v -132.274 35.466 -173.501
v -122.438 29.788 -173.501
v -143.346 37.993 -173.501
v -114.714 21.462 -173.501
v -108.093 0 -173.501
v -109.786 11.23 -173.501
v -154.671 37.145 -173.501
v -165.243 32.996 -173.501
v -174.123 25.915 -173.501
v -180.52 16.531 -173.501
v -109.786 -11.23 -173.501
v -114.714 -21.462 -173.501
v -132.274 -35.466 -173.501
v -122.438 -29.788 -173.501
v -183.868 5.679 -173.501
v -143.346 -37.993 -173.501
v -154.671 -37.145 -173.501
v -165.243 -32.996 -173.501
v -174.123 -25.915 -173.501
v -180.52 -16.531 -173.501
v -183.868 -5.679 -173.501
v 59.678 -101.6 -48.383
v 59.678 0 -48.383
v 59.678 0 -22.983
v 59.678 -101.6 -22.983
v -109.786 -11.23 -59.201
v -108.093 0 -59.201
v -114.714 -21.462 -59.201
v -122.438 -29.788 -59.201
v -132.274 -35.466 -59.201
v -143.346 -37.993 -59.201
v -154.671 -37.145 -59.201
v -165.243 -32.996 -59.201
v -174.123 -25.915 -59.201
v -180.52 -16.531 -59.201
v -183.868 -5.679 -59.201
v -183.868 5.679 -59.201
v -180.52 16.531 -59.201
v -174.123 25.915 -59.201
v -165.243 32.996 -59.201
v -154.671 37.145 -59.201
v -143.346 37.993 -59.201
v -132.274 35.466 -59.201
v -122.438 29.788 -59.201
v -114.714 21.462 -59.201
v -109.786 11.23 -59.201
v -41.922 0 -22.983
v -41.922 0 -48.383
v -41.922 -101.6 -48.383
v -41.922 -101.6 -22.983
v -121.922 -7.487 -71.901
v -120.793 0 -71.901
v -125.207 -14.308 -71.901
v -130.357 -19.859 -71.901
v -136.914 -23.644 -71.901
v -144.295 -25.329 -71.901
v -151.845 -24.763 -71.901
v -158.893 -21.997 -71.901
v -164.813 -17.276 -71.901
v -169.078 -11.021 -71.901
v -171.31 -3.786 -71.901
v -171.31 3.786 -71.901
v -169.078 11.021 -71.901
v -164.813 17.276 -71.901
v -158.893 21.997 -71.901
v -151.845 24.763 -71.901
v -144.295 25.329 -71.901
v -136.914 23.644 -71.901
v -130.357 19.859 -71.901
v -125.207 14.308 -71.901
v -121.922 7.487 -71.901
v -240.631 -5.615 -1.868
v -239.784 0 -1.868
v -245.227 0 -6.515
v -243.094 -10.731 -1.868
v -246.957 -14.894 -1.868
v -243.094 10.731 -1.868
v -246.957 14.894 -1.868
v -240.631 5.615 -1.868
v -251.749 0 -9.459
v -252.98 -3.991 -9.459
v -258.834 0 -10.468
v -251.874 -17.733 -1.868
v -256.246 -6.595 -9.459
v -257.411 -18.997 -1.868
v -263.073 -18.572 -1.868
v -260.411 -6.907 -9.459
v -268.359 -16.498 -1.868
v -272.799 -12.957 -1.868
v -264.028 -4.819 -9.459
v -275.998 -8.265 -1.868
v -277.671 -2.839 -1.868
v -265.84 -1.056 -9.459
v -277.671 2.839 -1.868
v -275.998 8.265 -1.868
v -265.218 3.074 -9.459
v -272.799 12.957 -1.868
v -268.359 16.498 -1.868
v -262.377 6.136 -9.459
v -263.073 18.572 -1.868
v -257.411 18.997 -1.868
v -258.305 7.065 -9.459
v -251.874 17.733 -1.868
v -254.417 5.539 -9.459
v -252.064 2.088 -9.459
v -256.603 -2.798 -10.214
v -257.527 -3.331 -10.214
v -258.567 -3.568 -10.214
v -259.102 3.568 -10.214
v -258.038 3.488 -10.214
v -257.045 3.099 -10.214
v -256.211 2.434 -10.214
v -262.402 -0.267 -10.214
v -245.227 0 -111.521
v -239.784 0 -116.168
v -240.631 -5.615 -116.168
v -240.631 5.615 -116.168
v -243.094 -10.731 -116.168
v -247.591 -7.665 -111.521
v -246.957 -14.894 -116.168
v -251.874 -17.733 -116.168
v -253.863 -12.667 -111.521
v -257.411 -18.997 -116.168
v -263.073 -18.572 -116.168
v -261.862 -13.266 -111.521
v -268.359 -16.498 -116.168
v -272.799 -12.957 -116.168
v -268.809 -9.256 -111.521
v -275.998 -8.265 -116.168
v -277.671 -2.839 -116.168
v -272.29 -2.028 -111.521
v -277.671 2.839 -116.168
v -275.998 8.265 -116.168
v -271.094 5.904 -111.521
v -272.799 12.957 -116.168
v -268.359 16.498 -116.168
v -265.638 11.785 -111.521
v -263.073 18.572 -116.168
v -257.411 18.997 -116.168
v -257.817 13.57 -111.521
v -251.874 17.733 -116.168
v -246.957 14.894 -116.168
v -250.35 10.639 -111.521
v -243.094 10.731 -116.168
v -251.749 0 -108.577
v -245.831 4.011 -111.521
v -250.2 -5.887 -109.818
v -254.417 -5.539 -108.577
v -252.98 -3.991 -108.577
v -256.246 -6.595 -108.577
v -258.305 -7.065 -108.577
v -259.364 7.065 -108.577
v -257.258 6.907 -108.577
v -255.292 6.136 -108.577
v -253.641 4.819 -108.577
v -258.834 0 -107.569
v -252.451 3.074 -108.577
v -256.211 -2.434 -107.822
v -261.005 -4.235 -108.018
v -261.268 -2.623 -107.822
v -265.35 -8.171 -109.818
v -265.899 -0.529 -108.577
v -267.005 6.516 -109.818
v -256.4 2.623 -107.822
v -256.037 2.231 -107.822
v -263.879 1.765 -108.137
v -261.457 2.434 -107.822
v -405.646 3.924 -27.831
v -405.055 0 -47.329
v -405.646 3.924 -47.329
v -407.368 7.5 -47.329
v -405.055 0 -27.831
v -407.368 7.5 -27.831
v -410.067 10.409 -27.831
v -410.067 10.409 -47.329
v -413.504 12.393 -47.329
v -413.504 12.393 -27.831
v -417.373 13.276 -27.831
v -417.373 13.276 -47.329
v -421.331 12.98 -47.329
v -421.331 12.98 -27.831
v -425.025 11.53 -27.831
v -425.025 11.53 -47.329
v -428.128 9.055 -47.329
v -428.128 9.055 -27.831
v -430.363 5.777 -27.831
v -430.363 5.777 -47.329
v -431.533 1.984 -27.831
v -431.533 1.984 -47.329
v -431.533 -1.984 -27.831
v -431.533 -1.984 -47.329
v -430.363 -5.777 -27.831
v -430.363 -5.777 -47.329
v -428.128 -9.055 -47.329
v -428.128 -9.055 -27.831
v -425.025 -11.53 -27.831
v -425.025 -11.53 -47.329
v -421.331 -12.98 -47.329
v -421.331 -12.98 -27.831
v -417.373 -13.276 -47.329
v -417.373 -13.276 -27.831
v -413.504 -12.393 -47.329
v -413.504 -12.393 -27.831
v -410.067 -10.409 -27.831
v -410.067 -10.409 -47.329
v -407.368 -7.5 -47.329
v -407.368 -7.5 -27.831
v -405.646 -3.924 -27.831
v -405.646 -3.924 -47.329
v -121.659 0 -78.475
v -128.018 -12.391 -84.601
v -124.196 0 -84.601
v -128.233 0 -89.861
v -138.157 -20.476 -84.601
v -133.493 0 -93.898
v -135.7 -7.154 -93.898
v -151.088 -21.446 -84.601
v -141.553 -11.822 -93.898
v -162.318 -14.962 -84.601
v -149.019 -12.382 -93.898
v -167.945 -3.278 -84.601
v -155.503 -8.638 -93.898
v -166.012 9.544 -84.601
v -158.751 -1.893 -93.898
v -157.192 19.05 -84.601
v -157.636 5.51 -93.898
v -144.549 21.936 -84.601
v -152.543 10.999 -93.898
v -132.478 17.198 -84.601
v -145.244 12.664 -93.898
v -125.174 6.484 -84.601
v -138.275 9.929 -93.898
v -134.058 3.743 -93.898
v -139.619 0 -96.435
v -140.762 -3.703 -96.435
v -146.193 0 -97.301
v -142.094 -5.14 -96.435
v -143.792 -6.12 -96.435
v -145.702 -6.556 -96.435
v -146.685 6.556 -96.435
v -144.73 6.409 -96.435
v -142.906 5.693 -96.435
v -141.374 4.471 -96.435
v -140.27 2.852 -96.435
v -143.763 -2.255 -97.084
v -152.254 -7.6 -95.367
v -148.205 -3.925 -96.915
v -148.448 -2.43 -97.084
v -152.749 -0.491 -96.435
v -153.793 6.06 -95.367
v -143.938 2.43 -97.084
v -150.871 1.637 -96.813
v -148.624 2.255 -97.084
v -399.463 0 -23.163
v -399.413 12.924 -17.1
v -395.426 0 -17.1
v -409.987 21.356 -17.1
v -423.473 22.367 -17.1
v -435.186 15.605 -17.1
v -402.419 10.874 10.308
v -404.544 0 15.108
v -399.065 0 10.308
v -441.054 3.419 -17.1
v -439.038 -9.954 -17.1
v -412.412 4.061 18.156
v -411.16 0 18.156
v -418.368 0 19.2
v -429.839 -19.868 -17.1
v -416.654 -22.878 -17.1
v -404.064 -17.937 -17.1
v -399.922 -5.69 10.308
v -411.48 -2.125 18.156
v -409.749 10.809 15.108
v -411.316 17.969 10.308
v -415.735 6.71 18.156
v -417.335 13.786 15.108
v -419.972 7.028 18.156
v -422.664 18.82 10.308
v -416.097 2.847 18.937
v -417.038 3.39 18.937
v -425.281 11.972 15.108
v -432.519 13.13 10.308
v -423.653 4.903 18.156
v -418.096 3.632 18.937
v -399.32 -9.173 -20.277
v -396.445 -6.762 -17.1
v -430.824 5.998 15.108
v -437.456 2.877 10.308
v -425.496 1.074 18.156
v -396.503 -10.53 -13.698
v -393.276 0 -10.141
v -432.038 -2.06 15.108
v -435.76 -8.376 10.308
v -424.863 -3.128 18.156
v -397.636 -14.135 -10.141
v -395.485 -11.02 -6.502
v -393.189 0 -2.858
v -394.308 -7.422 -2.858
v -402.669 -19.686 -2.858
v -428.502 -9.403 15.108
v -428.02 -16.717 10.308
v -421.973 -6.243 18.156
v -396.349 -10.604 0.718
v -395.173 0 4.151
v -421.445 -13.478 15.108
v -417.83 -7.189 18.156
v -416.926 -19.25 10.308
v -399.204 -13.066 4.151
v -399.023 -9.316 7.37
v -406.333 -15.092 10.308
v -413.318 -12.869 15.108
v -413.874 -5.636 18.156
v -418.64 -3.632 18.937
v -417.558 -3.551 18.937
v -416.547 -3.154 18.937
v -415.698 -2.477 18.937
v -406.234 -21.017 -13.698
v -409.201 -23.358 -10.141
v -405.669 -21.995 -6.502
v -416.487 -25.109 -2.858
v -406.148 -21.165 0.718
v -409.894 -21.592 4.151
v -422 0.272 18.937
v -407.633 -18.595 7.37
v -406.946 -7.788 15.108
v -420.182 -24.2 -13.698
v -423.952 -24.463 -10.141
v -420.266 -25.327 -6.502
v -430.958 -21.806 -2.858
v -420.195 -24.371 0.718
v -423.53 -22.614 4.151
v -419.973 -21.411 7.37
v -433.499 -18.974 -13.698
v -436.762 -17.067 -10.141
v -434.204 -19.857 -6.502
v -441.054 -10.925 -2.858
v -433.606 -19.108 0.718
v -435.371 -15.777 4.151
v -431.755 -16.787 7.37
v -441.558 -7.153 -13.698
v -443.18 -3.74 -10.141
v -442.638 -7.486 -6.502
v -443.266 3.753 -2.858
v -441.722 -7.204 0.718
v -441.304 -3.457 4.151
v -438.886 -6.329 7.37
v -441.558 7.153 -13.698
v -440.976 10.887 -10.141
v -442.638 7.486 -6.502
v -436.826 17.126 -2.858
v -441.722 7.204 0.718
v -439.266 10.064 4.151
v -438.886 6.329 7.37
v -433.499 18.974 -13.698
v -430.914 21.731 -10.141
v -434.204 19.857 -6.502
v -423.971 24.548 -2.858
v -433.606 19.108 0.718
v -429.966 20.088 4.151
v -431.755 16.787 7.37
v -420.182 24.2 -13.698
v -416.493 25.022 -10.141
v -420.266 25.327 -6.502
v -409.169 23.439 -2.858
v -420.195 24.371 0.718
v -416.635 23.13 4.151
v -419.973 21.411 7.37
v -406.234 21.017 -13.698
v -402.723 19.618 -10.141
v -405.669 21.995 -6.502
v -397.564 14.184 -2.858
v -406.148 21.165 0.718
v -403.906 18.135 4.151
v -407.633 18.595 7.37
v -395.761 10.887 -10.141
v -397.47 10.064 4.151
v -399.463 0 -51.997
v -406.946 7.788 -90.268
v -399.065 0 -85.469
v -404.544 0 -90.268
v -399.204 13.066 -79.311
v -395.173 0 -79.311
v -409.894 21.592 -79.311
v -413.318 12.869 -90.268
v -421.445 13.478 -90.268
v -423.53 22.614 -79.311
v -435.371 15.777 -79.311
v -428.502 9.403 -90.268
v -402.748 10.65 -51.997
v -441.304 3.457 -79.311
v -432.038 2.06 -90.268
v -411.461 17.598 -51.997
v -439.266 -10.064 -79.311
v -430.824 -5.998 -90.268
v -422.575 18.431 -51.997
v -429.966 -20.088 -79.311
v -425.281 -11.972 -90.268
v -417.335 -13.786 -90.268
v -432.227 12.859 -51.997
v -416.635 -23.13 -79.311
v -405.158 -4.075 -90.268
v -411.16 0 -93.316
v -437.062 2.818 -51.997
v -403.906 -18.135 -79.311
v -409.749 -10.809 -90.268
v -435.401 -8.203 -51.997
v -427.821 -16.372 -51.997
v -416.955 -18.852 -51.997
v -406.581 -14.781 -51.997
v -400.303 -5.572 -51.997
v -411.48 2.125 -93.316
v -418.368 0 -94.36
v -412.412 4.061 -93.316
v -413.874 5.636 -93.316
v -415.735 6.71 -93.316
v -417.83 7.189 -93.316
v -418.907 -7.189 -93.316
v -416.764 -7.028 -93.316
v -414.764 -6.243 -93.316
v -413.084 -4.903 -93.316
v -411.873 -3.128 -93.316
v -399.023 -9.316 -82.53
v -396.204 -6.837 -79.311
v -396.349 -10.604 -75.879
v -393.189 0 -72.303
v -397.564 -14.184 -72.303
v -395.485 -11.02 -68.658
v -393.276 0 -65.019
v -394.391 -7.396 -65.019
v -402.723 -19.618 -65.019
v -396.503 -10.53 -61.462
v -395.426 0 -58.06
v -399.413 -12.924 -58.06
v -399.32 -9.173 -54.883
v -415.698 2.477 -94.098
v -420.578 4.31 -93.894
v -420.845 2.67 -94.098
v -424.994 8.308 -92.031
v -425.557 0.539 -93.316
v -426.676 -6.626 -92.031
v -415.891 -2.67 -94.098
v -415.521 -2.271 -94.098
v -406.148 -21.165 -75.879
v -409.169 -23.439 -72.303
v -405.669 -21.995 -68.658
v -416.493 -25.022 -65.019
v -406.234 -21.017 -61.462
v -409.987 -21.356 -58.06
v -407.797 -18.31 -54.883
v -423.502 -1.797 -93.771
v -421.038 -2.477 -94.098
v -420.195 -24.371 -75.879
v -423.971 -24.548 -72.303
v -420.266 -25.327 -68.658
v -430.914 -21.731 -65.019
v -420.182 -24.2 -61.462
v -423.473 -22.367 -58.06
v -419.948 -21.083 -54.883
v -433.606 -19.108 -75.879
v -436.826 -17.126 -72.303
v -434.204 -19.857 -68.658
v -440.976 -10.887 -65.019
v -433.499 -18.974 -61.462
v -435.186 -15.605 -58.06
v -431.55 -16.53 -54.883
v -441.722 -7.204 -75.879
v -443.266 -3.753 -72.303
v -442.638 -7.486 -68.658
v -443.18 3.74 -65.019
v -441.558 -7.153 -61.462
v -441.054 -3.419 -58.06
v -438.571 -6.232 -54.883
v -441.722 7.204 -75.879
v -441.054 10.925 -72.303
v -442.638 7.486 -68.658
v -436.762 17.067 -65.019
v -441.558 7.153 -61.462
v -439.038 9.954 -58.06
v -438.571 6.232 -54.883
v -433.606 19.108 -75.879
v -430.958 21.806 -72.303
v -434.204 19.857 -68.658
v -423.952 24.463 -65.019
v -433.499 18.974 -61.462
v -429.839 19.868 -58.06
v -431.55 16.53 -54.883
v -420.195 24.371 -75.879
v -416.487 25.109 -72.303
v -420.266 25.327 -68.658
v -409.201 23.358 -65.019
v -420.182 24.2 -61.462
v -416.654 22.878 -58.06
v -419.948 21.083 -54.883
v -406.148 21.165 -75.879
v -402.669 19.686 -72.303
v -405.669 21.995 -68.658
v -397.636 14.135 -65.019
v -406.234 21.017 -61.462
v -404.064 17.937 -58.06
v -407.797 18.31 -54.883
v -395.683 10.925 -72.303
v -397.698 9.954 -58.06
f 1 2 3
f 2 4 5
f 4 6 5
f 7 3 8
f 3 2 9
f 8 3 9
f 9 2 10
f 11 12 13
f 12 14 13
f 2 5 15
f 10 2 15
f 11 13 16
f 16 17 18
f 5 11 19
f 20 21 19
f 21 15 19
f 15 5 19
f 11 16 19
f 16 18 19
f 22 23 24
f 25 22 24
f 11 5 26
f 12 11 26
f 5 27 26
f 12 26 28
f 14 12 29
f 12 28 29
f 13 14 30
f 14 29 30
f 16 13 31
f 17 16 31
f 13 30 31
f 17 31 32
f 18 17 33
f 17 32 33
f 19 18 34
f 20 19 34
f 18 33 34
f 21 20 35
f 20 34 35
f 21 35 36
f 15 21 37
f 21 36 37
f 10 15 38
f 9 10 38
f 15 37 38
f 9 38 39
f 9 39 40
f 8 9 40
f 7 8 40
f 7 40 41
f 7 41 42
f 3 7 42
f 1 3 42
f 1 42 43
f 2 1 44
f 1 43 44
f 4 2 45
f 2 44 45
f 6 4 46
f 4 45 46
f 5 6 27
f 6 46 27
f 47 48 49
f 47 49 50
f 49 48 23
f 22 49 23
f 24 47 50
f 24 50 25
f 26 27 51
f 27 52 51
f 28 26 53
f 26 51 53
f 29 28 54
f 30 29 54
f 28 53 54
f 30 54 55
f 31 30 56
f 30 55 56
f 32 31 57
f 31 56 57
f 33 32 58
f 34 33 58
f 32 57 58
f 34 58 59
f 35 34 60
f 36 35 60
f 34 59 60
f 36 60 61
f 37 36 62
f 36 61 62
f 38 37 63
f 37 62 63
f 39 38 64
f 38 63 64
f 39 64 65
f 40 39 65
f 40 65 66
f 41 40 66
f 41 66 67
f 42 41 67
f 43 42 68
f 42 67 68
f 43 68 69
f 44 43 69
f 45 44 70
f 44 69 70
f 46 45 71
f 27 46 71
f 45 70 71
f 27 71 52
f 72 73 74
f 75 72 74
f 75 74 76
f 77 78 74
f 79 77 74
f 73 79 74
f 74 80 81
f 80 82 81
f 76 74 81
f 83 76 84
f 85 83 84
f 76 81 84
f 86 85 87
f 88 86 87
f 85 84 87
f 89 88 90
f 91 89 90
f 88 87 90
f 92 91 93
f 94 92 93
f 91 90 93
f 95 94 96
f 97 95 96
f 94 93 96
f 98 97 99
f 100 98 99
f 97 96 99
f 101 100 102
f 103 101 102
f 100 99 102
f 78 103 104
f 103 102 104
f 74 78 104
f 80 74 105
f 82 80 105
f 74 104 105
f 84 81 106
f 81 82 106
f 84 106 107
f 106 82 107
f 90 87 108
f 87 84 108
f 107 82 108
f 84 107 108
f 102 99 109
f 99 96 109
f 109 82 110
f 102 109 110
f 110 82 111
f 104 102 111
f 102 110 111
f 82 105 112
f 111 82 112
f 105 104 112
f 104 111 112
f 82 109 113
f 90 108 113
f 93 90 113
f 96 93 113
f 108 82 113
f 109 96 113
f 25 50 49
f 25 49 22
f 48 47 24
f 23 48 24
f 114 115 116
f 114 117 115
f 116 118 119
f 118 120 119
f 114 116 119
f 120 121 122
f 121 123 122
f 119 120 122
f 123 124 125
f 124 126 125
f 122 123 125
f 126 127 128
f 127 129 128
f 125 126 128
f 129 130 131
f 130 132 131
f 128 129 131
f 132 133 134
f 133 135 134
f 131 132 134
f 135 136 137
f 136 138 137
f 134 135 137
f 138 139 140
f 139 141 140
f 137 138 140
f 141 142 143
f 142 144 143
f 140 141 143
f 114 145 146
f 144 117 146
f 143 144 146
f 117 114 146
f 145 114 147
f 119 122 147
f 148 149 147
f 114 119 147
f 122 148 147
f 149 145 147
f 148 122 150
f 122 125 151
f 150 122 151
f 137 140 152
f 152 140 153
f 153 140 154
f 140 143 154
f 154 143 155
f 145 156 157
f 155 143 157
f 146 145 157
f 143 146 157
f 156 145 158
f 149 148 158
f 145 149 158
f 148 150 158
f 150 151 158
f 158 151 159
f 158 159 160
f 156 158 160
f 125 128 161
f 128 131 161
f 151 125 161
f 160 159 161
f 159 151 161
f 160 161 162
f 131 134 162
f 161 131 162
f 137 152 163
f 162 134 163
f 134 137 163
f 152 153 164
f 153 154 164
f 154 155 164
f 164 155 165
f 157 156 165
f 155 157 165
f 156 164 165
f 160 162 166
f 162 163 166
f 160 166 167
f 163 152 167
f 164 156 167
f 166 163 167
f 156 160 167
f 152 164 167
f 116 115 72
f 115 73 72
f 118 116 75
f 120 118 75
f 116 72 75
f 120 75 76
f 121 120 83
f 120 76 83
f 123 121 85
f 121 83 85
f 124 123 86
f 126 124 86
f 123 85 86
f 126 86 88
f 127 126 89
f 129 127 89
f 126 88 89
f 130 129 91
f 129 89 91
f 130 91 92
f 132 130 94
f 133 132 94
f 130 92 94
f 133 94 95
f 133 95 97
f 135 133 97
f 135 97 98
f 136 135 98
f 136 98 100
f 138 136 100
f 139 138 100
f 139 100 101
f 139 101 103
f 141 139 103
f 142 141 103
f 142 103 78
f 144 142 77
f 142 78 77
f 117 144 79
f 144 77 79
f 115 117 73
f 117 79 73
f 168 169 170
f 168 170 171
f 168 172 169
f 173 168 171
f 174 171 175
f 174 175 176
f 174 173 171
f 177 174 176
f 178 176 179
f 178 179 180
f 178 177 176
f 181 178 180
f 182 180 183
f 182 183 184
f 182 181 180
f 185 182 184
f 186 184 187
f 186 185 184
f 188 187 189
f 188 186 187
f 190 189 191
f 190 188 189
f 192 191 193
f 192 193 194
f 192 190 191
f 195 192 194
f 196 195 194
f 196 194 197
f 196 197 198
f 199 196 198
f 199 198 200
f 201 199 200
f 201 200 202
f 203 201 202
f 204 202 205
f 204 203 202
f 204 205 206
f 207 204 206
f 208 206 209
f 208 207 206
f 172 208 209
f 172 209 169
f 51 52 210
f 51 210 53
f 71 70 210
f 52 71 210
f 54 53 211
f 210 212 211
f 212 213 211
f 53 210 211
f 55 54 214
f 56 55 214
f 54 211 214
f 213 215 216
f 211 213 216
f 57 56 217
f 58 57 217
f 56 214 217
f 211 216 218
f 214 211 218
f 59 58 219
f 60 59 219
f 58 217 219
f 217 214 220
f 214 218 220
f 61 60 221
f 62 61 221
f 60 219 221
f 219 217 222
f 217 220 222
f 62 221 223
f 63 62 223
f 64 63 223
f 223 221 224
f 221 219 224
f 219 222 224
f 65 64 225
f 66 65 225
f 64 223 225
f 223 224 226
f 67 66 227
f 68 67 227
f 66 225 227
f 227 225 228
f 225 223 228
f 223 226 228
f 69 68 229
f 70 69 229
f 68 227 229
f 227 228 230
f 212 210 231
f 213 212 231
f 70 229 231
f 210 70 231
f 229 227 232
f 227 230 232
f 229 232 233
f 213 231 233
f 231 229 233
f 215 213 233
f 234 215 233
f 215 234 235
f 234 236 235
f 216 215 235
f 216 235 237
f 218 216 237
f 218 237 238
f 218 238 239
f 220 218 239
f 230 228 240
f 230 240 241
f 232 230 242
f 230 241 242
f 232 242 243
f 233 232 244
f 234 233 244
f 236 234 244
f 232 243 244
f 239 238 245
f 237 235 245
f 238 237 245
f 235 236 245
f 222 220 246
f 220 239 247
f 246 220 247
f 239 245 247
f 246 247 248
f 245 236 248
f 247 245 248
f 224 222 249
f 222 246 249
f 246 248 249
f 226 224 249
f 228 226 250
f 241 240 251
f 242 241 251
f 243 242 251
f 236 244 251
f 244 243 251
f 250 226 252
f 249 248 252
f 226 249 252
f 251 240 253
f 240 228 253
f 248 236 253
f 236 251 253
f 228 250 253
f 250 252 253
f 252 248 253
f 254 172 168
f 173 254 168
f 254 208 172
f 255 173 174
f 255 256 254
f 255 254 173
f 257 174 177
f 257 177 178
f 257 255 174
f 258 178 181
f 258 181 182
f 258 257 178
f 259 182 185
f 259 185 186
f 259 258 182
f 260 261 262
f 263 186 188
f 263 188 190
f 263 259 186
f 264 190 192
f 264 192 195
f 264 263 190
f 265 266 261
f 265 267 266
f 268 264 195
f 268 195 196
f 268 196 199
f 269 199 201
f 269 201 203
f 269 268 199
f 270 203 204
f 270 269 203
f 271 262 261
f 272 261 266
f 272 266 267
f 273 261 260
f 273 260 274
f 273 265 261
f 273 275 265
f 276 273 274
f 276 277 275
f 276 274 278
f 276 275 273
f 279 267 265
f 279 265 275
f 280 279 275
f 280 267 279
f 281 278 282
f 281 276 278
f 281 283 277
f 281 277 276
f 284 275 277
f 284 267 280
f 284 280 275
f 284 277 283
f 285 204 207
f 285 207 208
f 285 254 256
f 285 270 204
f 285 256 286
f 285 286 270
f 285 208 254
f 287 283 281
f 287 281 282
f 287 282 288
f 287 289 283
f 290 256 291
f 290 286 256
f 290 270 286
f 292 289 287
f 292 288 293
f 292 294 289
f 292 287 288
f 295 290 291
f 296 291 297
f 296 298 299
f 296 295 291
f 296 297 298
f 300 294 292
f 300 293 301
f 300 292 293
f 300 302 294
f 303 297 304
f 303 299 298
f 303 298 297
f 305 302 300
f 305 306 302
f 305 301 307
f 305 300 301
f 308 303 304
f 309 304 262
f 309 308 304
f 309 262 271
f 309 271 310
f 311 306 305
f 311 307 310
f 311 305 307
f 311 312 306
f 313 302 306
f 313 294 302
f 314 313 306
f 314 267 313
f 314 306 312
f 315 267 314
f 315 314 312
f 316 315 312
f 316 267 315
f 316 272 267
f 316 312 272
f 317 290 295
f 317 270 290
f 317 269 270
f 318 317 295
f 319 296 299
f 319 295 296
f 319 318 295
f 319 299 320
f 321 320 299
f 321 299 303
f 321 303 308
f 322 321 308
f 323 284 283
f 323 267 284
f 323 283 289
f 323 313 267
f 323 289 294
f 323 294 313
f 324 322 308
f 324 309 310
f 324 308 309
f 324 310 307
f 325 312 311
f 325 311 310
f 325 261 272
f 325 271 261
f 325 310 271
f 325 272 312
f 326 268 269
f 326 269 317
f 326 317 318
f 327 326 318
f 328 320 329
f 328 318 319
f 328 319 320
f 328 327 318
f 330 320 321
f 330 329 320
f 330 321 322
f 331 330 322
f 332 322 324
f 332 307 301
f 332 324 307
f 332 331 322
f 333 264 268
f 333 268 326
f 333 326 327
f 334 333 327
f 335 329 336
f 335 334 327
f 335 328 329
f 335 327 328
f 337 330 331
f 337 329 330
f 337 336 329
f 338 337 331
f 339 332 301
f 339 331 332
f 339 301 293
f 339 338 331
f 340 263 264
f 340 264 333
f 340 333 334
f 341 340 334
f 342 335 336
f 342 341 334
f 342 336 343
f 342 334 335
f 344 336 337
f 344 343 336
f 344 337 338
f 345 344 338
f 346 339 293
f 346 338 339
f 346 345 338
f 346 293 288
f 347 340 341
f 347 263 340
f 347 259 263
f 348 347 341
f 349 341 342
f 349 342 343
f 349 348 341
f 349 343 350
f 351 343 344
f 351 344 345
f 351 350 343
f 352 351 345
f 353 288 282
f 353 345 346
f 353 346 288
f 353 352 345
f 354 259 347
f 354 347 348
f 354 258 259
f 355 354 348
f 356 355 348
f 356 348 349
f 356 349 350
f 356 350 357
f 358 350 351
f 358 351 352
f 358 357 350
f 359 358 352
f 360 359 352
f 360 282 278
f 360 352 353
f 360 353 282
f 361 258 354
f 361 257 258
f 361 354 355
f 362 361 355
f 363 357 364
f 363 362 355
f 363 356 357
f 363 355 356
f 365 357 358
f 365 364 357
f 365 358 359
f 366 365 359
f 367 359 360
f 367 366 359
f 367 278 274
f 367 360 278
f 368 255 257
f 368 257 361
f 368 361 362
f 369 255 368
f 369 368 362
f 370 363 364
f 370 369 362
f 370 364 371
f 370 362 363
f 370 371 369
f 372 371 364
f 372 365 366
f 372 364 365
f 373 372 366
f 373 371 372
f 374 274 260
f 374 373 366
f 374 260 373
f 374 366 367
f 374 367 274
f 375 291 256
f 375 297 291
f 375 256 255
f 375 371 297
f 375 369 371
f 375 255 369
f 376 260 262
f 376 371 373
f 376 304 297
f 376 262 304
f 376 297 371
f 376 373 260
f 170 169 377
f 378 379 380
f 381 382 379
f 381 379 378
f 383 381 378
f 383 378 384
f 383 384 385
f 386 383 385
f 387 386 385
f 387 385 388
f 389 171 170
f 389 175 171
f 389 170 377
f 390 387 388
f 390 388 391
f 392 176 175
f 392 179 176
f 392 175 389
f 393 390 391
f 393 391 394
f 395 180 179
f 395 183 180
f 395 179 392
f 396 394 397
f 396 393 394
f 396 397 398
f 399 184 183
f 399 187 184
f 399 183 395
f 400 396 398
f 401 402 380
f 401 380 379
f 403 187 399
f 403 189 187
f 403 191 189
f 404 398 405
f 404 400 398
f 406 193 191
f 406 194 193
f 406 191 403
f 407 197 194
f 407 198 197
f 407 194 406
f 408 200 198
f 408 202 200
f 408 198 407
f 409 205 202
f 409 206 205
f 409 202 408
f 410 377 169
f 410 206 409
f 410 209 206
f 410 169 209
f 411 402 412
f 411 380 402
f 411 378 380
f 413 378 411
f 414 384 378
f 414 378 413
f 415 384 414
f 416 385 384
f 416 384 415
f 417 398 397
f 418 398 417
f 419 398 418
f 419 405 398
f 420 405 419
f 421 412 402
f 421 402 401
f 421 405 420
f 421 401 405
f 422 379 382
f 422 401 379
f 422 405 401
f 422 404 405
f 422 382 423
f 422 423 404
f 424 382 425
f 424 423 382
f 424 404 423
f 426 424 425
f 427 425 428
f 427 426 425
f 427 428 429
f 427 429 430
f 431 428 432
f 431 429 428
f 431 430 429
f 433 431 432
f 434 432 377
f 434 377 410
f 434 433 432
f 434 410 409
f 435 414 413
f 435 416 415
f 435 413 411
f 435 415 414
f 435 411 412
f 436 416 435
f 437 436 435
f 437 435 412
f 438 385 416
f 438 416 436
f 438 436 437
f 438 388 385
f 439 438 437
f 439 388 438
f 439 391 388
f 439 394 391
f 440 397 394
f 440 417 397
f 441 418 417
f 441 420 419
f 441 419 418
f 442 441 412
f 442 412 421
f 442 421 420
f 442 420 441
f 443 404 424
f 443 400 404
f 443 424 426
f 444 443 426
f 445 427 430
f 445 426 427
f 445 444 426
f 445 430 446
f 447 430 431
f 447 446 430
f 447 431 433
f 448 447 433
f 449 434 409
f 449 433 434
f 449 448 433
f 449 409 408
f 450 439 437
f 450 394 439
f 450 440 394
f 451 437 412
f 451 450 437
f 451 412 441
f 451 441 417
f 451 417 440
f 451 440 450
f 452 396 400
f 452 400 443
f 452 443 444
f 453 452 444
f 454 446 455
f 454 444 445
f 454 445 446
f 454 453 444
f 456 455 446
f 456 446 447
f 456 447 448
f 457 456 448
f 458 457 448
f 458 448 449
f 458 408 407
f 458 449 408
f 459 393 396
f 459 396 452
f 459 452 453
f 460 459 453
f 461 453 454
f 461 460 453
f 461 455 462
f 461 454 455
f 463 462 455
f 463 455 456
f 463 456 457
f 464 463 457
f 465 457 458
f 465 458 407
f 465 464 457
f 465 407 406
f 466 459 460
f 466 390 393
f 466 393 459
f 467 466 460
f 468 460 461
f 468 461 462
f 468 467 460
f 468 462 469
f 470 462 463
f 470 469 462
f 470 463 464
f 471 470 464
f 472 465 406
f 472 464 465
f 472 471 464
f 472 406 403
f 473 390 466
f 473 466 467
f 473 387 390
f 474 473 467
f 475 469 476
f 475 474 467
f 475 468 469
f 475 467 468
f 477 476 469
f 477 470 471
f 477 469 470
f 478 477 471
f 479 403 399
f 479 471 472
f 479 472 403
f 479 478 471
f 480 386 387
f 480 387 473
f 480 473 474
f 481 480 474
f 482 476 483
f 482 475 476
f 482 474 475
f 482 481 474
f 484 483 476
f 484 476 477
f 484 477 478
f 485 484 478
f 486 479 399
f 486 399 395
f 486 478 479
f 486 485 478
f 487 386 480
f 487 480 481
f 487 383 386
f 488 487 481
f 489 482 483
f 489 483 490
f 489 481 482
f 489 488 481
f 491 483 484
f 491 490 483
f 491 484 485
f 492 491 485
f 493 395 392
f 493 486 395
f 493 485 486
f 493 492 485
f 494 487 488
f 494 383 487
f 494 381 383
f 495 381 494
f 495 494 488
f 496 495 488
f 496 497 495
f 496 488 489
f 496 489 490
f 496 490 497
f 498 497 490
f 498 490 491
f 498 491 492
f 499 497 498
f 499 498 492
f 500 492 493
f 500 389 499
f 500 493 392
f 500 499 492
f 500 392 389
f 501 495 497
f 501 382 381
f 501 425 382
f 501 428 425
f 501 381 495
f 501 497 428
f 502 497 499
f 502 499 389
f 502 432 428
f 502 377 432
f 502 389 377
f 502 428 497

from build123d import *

# Parameters (mm, degrees)
F0_W     = 101.6
F0_H     = 25.4
F1_DEPTH = 101.6


with BuildPart() as f1:
    # F0 (on Front) → F1 (new body)
    with BuildSketch(Plane.XZ):
        with Locations((8.878003, -35.683164)):
            Rectangle(F0_W, F0_H)
    extrude(amount=F1_DEPTH)


with BuildPart() as f3:
    # F2 (on Front) → F3 (revolve)
    with BuildSketch(Plane.XZ):
        with BuildLine():
            ThreePointArc((-239.784222, -1.868043), (-248.383701, -8.218043), (-258.834222, -10.467522))
            Line((-258.834222, -10.467522), (-258.834222, -67.617522))
            Line((-258.834222, -67.617522), (-258.834222, -107.568564))
            ThreePointArc((-258.834222, -107.568564), (-248.383701, -109.818043), (-239.784222, -116.168043))
            Line((-239.784222, -116.168043), (-239.784222, -1.868043))
        make_face()
    revolve(axis=Axis((-258.834222, 0, -35.867522), (0, 0, -1)))


with BuildPart() as f5:
    # F4 (on Front) → F5 (revolve)
    with BuildSketch(Plane.XZ):
        with BuildLine():
            Line((-418.36825, 19.199955), (-418.36825, -94.360235))
            ThreePointArc((-418.36825, -94.360235), (-393.928592, -75.87855), (-405.054764, -47.328982))
            Line((-405.054764, -47.328982), (-405.054764, -27.831297))
            ThreePointArc((-405.054764, -27.831297), (-393.928592, 0.718271), (-418.36825, 19.199955))
        make_face()
    revolve(axis=Axis((-418.36825, 0, -40.279704), (0, 0, 1)))


with BuildPart() as f7:
    # F6 (on Front) → F7 (revolve)
    with BuildSketch(Plane.XZ):
        with BuildLine():
            Line((-146.193306, -97.300895), (-146.193306, -173.500895))
            Line((-146.193306, -173.500895), (-120.793306, -173.500895))
            Line((-120.793306, -173.500895), (-108.093306, -173.500895))
            Line((-108.093306, -173.500895), (-108.093306, -69.411388))
            Line((-108.093306, -69.411388), (-108.093306, -59.200895))
            Line((-108.093306, -59.200895), (-120.793306, -71.900895))
            ThreePointArc((-120.793306, -71.900895), (-128.232793, -89.861407), (-146.193306, -97.300895))
        make_face()
    revolve(axis=Axis((-146.193306, 0, -141.229197), (0, 0, -1)))


solid = Compound([f1.part, f3.part, f5.part, f7.part])
